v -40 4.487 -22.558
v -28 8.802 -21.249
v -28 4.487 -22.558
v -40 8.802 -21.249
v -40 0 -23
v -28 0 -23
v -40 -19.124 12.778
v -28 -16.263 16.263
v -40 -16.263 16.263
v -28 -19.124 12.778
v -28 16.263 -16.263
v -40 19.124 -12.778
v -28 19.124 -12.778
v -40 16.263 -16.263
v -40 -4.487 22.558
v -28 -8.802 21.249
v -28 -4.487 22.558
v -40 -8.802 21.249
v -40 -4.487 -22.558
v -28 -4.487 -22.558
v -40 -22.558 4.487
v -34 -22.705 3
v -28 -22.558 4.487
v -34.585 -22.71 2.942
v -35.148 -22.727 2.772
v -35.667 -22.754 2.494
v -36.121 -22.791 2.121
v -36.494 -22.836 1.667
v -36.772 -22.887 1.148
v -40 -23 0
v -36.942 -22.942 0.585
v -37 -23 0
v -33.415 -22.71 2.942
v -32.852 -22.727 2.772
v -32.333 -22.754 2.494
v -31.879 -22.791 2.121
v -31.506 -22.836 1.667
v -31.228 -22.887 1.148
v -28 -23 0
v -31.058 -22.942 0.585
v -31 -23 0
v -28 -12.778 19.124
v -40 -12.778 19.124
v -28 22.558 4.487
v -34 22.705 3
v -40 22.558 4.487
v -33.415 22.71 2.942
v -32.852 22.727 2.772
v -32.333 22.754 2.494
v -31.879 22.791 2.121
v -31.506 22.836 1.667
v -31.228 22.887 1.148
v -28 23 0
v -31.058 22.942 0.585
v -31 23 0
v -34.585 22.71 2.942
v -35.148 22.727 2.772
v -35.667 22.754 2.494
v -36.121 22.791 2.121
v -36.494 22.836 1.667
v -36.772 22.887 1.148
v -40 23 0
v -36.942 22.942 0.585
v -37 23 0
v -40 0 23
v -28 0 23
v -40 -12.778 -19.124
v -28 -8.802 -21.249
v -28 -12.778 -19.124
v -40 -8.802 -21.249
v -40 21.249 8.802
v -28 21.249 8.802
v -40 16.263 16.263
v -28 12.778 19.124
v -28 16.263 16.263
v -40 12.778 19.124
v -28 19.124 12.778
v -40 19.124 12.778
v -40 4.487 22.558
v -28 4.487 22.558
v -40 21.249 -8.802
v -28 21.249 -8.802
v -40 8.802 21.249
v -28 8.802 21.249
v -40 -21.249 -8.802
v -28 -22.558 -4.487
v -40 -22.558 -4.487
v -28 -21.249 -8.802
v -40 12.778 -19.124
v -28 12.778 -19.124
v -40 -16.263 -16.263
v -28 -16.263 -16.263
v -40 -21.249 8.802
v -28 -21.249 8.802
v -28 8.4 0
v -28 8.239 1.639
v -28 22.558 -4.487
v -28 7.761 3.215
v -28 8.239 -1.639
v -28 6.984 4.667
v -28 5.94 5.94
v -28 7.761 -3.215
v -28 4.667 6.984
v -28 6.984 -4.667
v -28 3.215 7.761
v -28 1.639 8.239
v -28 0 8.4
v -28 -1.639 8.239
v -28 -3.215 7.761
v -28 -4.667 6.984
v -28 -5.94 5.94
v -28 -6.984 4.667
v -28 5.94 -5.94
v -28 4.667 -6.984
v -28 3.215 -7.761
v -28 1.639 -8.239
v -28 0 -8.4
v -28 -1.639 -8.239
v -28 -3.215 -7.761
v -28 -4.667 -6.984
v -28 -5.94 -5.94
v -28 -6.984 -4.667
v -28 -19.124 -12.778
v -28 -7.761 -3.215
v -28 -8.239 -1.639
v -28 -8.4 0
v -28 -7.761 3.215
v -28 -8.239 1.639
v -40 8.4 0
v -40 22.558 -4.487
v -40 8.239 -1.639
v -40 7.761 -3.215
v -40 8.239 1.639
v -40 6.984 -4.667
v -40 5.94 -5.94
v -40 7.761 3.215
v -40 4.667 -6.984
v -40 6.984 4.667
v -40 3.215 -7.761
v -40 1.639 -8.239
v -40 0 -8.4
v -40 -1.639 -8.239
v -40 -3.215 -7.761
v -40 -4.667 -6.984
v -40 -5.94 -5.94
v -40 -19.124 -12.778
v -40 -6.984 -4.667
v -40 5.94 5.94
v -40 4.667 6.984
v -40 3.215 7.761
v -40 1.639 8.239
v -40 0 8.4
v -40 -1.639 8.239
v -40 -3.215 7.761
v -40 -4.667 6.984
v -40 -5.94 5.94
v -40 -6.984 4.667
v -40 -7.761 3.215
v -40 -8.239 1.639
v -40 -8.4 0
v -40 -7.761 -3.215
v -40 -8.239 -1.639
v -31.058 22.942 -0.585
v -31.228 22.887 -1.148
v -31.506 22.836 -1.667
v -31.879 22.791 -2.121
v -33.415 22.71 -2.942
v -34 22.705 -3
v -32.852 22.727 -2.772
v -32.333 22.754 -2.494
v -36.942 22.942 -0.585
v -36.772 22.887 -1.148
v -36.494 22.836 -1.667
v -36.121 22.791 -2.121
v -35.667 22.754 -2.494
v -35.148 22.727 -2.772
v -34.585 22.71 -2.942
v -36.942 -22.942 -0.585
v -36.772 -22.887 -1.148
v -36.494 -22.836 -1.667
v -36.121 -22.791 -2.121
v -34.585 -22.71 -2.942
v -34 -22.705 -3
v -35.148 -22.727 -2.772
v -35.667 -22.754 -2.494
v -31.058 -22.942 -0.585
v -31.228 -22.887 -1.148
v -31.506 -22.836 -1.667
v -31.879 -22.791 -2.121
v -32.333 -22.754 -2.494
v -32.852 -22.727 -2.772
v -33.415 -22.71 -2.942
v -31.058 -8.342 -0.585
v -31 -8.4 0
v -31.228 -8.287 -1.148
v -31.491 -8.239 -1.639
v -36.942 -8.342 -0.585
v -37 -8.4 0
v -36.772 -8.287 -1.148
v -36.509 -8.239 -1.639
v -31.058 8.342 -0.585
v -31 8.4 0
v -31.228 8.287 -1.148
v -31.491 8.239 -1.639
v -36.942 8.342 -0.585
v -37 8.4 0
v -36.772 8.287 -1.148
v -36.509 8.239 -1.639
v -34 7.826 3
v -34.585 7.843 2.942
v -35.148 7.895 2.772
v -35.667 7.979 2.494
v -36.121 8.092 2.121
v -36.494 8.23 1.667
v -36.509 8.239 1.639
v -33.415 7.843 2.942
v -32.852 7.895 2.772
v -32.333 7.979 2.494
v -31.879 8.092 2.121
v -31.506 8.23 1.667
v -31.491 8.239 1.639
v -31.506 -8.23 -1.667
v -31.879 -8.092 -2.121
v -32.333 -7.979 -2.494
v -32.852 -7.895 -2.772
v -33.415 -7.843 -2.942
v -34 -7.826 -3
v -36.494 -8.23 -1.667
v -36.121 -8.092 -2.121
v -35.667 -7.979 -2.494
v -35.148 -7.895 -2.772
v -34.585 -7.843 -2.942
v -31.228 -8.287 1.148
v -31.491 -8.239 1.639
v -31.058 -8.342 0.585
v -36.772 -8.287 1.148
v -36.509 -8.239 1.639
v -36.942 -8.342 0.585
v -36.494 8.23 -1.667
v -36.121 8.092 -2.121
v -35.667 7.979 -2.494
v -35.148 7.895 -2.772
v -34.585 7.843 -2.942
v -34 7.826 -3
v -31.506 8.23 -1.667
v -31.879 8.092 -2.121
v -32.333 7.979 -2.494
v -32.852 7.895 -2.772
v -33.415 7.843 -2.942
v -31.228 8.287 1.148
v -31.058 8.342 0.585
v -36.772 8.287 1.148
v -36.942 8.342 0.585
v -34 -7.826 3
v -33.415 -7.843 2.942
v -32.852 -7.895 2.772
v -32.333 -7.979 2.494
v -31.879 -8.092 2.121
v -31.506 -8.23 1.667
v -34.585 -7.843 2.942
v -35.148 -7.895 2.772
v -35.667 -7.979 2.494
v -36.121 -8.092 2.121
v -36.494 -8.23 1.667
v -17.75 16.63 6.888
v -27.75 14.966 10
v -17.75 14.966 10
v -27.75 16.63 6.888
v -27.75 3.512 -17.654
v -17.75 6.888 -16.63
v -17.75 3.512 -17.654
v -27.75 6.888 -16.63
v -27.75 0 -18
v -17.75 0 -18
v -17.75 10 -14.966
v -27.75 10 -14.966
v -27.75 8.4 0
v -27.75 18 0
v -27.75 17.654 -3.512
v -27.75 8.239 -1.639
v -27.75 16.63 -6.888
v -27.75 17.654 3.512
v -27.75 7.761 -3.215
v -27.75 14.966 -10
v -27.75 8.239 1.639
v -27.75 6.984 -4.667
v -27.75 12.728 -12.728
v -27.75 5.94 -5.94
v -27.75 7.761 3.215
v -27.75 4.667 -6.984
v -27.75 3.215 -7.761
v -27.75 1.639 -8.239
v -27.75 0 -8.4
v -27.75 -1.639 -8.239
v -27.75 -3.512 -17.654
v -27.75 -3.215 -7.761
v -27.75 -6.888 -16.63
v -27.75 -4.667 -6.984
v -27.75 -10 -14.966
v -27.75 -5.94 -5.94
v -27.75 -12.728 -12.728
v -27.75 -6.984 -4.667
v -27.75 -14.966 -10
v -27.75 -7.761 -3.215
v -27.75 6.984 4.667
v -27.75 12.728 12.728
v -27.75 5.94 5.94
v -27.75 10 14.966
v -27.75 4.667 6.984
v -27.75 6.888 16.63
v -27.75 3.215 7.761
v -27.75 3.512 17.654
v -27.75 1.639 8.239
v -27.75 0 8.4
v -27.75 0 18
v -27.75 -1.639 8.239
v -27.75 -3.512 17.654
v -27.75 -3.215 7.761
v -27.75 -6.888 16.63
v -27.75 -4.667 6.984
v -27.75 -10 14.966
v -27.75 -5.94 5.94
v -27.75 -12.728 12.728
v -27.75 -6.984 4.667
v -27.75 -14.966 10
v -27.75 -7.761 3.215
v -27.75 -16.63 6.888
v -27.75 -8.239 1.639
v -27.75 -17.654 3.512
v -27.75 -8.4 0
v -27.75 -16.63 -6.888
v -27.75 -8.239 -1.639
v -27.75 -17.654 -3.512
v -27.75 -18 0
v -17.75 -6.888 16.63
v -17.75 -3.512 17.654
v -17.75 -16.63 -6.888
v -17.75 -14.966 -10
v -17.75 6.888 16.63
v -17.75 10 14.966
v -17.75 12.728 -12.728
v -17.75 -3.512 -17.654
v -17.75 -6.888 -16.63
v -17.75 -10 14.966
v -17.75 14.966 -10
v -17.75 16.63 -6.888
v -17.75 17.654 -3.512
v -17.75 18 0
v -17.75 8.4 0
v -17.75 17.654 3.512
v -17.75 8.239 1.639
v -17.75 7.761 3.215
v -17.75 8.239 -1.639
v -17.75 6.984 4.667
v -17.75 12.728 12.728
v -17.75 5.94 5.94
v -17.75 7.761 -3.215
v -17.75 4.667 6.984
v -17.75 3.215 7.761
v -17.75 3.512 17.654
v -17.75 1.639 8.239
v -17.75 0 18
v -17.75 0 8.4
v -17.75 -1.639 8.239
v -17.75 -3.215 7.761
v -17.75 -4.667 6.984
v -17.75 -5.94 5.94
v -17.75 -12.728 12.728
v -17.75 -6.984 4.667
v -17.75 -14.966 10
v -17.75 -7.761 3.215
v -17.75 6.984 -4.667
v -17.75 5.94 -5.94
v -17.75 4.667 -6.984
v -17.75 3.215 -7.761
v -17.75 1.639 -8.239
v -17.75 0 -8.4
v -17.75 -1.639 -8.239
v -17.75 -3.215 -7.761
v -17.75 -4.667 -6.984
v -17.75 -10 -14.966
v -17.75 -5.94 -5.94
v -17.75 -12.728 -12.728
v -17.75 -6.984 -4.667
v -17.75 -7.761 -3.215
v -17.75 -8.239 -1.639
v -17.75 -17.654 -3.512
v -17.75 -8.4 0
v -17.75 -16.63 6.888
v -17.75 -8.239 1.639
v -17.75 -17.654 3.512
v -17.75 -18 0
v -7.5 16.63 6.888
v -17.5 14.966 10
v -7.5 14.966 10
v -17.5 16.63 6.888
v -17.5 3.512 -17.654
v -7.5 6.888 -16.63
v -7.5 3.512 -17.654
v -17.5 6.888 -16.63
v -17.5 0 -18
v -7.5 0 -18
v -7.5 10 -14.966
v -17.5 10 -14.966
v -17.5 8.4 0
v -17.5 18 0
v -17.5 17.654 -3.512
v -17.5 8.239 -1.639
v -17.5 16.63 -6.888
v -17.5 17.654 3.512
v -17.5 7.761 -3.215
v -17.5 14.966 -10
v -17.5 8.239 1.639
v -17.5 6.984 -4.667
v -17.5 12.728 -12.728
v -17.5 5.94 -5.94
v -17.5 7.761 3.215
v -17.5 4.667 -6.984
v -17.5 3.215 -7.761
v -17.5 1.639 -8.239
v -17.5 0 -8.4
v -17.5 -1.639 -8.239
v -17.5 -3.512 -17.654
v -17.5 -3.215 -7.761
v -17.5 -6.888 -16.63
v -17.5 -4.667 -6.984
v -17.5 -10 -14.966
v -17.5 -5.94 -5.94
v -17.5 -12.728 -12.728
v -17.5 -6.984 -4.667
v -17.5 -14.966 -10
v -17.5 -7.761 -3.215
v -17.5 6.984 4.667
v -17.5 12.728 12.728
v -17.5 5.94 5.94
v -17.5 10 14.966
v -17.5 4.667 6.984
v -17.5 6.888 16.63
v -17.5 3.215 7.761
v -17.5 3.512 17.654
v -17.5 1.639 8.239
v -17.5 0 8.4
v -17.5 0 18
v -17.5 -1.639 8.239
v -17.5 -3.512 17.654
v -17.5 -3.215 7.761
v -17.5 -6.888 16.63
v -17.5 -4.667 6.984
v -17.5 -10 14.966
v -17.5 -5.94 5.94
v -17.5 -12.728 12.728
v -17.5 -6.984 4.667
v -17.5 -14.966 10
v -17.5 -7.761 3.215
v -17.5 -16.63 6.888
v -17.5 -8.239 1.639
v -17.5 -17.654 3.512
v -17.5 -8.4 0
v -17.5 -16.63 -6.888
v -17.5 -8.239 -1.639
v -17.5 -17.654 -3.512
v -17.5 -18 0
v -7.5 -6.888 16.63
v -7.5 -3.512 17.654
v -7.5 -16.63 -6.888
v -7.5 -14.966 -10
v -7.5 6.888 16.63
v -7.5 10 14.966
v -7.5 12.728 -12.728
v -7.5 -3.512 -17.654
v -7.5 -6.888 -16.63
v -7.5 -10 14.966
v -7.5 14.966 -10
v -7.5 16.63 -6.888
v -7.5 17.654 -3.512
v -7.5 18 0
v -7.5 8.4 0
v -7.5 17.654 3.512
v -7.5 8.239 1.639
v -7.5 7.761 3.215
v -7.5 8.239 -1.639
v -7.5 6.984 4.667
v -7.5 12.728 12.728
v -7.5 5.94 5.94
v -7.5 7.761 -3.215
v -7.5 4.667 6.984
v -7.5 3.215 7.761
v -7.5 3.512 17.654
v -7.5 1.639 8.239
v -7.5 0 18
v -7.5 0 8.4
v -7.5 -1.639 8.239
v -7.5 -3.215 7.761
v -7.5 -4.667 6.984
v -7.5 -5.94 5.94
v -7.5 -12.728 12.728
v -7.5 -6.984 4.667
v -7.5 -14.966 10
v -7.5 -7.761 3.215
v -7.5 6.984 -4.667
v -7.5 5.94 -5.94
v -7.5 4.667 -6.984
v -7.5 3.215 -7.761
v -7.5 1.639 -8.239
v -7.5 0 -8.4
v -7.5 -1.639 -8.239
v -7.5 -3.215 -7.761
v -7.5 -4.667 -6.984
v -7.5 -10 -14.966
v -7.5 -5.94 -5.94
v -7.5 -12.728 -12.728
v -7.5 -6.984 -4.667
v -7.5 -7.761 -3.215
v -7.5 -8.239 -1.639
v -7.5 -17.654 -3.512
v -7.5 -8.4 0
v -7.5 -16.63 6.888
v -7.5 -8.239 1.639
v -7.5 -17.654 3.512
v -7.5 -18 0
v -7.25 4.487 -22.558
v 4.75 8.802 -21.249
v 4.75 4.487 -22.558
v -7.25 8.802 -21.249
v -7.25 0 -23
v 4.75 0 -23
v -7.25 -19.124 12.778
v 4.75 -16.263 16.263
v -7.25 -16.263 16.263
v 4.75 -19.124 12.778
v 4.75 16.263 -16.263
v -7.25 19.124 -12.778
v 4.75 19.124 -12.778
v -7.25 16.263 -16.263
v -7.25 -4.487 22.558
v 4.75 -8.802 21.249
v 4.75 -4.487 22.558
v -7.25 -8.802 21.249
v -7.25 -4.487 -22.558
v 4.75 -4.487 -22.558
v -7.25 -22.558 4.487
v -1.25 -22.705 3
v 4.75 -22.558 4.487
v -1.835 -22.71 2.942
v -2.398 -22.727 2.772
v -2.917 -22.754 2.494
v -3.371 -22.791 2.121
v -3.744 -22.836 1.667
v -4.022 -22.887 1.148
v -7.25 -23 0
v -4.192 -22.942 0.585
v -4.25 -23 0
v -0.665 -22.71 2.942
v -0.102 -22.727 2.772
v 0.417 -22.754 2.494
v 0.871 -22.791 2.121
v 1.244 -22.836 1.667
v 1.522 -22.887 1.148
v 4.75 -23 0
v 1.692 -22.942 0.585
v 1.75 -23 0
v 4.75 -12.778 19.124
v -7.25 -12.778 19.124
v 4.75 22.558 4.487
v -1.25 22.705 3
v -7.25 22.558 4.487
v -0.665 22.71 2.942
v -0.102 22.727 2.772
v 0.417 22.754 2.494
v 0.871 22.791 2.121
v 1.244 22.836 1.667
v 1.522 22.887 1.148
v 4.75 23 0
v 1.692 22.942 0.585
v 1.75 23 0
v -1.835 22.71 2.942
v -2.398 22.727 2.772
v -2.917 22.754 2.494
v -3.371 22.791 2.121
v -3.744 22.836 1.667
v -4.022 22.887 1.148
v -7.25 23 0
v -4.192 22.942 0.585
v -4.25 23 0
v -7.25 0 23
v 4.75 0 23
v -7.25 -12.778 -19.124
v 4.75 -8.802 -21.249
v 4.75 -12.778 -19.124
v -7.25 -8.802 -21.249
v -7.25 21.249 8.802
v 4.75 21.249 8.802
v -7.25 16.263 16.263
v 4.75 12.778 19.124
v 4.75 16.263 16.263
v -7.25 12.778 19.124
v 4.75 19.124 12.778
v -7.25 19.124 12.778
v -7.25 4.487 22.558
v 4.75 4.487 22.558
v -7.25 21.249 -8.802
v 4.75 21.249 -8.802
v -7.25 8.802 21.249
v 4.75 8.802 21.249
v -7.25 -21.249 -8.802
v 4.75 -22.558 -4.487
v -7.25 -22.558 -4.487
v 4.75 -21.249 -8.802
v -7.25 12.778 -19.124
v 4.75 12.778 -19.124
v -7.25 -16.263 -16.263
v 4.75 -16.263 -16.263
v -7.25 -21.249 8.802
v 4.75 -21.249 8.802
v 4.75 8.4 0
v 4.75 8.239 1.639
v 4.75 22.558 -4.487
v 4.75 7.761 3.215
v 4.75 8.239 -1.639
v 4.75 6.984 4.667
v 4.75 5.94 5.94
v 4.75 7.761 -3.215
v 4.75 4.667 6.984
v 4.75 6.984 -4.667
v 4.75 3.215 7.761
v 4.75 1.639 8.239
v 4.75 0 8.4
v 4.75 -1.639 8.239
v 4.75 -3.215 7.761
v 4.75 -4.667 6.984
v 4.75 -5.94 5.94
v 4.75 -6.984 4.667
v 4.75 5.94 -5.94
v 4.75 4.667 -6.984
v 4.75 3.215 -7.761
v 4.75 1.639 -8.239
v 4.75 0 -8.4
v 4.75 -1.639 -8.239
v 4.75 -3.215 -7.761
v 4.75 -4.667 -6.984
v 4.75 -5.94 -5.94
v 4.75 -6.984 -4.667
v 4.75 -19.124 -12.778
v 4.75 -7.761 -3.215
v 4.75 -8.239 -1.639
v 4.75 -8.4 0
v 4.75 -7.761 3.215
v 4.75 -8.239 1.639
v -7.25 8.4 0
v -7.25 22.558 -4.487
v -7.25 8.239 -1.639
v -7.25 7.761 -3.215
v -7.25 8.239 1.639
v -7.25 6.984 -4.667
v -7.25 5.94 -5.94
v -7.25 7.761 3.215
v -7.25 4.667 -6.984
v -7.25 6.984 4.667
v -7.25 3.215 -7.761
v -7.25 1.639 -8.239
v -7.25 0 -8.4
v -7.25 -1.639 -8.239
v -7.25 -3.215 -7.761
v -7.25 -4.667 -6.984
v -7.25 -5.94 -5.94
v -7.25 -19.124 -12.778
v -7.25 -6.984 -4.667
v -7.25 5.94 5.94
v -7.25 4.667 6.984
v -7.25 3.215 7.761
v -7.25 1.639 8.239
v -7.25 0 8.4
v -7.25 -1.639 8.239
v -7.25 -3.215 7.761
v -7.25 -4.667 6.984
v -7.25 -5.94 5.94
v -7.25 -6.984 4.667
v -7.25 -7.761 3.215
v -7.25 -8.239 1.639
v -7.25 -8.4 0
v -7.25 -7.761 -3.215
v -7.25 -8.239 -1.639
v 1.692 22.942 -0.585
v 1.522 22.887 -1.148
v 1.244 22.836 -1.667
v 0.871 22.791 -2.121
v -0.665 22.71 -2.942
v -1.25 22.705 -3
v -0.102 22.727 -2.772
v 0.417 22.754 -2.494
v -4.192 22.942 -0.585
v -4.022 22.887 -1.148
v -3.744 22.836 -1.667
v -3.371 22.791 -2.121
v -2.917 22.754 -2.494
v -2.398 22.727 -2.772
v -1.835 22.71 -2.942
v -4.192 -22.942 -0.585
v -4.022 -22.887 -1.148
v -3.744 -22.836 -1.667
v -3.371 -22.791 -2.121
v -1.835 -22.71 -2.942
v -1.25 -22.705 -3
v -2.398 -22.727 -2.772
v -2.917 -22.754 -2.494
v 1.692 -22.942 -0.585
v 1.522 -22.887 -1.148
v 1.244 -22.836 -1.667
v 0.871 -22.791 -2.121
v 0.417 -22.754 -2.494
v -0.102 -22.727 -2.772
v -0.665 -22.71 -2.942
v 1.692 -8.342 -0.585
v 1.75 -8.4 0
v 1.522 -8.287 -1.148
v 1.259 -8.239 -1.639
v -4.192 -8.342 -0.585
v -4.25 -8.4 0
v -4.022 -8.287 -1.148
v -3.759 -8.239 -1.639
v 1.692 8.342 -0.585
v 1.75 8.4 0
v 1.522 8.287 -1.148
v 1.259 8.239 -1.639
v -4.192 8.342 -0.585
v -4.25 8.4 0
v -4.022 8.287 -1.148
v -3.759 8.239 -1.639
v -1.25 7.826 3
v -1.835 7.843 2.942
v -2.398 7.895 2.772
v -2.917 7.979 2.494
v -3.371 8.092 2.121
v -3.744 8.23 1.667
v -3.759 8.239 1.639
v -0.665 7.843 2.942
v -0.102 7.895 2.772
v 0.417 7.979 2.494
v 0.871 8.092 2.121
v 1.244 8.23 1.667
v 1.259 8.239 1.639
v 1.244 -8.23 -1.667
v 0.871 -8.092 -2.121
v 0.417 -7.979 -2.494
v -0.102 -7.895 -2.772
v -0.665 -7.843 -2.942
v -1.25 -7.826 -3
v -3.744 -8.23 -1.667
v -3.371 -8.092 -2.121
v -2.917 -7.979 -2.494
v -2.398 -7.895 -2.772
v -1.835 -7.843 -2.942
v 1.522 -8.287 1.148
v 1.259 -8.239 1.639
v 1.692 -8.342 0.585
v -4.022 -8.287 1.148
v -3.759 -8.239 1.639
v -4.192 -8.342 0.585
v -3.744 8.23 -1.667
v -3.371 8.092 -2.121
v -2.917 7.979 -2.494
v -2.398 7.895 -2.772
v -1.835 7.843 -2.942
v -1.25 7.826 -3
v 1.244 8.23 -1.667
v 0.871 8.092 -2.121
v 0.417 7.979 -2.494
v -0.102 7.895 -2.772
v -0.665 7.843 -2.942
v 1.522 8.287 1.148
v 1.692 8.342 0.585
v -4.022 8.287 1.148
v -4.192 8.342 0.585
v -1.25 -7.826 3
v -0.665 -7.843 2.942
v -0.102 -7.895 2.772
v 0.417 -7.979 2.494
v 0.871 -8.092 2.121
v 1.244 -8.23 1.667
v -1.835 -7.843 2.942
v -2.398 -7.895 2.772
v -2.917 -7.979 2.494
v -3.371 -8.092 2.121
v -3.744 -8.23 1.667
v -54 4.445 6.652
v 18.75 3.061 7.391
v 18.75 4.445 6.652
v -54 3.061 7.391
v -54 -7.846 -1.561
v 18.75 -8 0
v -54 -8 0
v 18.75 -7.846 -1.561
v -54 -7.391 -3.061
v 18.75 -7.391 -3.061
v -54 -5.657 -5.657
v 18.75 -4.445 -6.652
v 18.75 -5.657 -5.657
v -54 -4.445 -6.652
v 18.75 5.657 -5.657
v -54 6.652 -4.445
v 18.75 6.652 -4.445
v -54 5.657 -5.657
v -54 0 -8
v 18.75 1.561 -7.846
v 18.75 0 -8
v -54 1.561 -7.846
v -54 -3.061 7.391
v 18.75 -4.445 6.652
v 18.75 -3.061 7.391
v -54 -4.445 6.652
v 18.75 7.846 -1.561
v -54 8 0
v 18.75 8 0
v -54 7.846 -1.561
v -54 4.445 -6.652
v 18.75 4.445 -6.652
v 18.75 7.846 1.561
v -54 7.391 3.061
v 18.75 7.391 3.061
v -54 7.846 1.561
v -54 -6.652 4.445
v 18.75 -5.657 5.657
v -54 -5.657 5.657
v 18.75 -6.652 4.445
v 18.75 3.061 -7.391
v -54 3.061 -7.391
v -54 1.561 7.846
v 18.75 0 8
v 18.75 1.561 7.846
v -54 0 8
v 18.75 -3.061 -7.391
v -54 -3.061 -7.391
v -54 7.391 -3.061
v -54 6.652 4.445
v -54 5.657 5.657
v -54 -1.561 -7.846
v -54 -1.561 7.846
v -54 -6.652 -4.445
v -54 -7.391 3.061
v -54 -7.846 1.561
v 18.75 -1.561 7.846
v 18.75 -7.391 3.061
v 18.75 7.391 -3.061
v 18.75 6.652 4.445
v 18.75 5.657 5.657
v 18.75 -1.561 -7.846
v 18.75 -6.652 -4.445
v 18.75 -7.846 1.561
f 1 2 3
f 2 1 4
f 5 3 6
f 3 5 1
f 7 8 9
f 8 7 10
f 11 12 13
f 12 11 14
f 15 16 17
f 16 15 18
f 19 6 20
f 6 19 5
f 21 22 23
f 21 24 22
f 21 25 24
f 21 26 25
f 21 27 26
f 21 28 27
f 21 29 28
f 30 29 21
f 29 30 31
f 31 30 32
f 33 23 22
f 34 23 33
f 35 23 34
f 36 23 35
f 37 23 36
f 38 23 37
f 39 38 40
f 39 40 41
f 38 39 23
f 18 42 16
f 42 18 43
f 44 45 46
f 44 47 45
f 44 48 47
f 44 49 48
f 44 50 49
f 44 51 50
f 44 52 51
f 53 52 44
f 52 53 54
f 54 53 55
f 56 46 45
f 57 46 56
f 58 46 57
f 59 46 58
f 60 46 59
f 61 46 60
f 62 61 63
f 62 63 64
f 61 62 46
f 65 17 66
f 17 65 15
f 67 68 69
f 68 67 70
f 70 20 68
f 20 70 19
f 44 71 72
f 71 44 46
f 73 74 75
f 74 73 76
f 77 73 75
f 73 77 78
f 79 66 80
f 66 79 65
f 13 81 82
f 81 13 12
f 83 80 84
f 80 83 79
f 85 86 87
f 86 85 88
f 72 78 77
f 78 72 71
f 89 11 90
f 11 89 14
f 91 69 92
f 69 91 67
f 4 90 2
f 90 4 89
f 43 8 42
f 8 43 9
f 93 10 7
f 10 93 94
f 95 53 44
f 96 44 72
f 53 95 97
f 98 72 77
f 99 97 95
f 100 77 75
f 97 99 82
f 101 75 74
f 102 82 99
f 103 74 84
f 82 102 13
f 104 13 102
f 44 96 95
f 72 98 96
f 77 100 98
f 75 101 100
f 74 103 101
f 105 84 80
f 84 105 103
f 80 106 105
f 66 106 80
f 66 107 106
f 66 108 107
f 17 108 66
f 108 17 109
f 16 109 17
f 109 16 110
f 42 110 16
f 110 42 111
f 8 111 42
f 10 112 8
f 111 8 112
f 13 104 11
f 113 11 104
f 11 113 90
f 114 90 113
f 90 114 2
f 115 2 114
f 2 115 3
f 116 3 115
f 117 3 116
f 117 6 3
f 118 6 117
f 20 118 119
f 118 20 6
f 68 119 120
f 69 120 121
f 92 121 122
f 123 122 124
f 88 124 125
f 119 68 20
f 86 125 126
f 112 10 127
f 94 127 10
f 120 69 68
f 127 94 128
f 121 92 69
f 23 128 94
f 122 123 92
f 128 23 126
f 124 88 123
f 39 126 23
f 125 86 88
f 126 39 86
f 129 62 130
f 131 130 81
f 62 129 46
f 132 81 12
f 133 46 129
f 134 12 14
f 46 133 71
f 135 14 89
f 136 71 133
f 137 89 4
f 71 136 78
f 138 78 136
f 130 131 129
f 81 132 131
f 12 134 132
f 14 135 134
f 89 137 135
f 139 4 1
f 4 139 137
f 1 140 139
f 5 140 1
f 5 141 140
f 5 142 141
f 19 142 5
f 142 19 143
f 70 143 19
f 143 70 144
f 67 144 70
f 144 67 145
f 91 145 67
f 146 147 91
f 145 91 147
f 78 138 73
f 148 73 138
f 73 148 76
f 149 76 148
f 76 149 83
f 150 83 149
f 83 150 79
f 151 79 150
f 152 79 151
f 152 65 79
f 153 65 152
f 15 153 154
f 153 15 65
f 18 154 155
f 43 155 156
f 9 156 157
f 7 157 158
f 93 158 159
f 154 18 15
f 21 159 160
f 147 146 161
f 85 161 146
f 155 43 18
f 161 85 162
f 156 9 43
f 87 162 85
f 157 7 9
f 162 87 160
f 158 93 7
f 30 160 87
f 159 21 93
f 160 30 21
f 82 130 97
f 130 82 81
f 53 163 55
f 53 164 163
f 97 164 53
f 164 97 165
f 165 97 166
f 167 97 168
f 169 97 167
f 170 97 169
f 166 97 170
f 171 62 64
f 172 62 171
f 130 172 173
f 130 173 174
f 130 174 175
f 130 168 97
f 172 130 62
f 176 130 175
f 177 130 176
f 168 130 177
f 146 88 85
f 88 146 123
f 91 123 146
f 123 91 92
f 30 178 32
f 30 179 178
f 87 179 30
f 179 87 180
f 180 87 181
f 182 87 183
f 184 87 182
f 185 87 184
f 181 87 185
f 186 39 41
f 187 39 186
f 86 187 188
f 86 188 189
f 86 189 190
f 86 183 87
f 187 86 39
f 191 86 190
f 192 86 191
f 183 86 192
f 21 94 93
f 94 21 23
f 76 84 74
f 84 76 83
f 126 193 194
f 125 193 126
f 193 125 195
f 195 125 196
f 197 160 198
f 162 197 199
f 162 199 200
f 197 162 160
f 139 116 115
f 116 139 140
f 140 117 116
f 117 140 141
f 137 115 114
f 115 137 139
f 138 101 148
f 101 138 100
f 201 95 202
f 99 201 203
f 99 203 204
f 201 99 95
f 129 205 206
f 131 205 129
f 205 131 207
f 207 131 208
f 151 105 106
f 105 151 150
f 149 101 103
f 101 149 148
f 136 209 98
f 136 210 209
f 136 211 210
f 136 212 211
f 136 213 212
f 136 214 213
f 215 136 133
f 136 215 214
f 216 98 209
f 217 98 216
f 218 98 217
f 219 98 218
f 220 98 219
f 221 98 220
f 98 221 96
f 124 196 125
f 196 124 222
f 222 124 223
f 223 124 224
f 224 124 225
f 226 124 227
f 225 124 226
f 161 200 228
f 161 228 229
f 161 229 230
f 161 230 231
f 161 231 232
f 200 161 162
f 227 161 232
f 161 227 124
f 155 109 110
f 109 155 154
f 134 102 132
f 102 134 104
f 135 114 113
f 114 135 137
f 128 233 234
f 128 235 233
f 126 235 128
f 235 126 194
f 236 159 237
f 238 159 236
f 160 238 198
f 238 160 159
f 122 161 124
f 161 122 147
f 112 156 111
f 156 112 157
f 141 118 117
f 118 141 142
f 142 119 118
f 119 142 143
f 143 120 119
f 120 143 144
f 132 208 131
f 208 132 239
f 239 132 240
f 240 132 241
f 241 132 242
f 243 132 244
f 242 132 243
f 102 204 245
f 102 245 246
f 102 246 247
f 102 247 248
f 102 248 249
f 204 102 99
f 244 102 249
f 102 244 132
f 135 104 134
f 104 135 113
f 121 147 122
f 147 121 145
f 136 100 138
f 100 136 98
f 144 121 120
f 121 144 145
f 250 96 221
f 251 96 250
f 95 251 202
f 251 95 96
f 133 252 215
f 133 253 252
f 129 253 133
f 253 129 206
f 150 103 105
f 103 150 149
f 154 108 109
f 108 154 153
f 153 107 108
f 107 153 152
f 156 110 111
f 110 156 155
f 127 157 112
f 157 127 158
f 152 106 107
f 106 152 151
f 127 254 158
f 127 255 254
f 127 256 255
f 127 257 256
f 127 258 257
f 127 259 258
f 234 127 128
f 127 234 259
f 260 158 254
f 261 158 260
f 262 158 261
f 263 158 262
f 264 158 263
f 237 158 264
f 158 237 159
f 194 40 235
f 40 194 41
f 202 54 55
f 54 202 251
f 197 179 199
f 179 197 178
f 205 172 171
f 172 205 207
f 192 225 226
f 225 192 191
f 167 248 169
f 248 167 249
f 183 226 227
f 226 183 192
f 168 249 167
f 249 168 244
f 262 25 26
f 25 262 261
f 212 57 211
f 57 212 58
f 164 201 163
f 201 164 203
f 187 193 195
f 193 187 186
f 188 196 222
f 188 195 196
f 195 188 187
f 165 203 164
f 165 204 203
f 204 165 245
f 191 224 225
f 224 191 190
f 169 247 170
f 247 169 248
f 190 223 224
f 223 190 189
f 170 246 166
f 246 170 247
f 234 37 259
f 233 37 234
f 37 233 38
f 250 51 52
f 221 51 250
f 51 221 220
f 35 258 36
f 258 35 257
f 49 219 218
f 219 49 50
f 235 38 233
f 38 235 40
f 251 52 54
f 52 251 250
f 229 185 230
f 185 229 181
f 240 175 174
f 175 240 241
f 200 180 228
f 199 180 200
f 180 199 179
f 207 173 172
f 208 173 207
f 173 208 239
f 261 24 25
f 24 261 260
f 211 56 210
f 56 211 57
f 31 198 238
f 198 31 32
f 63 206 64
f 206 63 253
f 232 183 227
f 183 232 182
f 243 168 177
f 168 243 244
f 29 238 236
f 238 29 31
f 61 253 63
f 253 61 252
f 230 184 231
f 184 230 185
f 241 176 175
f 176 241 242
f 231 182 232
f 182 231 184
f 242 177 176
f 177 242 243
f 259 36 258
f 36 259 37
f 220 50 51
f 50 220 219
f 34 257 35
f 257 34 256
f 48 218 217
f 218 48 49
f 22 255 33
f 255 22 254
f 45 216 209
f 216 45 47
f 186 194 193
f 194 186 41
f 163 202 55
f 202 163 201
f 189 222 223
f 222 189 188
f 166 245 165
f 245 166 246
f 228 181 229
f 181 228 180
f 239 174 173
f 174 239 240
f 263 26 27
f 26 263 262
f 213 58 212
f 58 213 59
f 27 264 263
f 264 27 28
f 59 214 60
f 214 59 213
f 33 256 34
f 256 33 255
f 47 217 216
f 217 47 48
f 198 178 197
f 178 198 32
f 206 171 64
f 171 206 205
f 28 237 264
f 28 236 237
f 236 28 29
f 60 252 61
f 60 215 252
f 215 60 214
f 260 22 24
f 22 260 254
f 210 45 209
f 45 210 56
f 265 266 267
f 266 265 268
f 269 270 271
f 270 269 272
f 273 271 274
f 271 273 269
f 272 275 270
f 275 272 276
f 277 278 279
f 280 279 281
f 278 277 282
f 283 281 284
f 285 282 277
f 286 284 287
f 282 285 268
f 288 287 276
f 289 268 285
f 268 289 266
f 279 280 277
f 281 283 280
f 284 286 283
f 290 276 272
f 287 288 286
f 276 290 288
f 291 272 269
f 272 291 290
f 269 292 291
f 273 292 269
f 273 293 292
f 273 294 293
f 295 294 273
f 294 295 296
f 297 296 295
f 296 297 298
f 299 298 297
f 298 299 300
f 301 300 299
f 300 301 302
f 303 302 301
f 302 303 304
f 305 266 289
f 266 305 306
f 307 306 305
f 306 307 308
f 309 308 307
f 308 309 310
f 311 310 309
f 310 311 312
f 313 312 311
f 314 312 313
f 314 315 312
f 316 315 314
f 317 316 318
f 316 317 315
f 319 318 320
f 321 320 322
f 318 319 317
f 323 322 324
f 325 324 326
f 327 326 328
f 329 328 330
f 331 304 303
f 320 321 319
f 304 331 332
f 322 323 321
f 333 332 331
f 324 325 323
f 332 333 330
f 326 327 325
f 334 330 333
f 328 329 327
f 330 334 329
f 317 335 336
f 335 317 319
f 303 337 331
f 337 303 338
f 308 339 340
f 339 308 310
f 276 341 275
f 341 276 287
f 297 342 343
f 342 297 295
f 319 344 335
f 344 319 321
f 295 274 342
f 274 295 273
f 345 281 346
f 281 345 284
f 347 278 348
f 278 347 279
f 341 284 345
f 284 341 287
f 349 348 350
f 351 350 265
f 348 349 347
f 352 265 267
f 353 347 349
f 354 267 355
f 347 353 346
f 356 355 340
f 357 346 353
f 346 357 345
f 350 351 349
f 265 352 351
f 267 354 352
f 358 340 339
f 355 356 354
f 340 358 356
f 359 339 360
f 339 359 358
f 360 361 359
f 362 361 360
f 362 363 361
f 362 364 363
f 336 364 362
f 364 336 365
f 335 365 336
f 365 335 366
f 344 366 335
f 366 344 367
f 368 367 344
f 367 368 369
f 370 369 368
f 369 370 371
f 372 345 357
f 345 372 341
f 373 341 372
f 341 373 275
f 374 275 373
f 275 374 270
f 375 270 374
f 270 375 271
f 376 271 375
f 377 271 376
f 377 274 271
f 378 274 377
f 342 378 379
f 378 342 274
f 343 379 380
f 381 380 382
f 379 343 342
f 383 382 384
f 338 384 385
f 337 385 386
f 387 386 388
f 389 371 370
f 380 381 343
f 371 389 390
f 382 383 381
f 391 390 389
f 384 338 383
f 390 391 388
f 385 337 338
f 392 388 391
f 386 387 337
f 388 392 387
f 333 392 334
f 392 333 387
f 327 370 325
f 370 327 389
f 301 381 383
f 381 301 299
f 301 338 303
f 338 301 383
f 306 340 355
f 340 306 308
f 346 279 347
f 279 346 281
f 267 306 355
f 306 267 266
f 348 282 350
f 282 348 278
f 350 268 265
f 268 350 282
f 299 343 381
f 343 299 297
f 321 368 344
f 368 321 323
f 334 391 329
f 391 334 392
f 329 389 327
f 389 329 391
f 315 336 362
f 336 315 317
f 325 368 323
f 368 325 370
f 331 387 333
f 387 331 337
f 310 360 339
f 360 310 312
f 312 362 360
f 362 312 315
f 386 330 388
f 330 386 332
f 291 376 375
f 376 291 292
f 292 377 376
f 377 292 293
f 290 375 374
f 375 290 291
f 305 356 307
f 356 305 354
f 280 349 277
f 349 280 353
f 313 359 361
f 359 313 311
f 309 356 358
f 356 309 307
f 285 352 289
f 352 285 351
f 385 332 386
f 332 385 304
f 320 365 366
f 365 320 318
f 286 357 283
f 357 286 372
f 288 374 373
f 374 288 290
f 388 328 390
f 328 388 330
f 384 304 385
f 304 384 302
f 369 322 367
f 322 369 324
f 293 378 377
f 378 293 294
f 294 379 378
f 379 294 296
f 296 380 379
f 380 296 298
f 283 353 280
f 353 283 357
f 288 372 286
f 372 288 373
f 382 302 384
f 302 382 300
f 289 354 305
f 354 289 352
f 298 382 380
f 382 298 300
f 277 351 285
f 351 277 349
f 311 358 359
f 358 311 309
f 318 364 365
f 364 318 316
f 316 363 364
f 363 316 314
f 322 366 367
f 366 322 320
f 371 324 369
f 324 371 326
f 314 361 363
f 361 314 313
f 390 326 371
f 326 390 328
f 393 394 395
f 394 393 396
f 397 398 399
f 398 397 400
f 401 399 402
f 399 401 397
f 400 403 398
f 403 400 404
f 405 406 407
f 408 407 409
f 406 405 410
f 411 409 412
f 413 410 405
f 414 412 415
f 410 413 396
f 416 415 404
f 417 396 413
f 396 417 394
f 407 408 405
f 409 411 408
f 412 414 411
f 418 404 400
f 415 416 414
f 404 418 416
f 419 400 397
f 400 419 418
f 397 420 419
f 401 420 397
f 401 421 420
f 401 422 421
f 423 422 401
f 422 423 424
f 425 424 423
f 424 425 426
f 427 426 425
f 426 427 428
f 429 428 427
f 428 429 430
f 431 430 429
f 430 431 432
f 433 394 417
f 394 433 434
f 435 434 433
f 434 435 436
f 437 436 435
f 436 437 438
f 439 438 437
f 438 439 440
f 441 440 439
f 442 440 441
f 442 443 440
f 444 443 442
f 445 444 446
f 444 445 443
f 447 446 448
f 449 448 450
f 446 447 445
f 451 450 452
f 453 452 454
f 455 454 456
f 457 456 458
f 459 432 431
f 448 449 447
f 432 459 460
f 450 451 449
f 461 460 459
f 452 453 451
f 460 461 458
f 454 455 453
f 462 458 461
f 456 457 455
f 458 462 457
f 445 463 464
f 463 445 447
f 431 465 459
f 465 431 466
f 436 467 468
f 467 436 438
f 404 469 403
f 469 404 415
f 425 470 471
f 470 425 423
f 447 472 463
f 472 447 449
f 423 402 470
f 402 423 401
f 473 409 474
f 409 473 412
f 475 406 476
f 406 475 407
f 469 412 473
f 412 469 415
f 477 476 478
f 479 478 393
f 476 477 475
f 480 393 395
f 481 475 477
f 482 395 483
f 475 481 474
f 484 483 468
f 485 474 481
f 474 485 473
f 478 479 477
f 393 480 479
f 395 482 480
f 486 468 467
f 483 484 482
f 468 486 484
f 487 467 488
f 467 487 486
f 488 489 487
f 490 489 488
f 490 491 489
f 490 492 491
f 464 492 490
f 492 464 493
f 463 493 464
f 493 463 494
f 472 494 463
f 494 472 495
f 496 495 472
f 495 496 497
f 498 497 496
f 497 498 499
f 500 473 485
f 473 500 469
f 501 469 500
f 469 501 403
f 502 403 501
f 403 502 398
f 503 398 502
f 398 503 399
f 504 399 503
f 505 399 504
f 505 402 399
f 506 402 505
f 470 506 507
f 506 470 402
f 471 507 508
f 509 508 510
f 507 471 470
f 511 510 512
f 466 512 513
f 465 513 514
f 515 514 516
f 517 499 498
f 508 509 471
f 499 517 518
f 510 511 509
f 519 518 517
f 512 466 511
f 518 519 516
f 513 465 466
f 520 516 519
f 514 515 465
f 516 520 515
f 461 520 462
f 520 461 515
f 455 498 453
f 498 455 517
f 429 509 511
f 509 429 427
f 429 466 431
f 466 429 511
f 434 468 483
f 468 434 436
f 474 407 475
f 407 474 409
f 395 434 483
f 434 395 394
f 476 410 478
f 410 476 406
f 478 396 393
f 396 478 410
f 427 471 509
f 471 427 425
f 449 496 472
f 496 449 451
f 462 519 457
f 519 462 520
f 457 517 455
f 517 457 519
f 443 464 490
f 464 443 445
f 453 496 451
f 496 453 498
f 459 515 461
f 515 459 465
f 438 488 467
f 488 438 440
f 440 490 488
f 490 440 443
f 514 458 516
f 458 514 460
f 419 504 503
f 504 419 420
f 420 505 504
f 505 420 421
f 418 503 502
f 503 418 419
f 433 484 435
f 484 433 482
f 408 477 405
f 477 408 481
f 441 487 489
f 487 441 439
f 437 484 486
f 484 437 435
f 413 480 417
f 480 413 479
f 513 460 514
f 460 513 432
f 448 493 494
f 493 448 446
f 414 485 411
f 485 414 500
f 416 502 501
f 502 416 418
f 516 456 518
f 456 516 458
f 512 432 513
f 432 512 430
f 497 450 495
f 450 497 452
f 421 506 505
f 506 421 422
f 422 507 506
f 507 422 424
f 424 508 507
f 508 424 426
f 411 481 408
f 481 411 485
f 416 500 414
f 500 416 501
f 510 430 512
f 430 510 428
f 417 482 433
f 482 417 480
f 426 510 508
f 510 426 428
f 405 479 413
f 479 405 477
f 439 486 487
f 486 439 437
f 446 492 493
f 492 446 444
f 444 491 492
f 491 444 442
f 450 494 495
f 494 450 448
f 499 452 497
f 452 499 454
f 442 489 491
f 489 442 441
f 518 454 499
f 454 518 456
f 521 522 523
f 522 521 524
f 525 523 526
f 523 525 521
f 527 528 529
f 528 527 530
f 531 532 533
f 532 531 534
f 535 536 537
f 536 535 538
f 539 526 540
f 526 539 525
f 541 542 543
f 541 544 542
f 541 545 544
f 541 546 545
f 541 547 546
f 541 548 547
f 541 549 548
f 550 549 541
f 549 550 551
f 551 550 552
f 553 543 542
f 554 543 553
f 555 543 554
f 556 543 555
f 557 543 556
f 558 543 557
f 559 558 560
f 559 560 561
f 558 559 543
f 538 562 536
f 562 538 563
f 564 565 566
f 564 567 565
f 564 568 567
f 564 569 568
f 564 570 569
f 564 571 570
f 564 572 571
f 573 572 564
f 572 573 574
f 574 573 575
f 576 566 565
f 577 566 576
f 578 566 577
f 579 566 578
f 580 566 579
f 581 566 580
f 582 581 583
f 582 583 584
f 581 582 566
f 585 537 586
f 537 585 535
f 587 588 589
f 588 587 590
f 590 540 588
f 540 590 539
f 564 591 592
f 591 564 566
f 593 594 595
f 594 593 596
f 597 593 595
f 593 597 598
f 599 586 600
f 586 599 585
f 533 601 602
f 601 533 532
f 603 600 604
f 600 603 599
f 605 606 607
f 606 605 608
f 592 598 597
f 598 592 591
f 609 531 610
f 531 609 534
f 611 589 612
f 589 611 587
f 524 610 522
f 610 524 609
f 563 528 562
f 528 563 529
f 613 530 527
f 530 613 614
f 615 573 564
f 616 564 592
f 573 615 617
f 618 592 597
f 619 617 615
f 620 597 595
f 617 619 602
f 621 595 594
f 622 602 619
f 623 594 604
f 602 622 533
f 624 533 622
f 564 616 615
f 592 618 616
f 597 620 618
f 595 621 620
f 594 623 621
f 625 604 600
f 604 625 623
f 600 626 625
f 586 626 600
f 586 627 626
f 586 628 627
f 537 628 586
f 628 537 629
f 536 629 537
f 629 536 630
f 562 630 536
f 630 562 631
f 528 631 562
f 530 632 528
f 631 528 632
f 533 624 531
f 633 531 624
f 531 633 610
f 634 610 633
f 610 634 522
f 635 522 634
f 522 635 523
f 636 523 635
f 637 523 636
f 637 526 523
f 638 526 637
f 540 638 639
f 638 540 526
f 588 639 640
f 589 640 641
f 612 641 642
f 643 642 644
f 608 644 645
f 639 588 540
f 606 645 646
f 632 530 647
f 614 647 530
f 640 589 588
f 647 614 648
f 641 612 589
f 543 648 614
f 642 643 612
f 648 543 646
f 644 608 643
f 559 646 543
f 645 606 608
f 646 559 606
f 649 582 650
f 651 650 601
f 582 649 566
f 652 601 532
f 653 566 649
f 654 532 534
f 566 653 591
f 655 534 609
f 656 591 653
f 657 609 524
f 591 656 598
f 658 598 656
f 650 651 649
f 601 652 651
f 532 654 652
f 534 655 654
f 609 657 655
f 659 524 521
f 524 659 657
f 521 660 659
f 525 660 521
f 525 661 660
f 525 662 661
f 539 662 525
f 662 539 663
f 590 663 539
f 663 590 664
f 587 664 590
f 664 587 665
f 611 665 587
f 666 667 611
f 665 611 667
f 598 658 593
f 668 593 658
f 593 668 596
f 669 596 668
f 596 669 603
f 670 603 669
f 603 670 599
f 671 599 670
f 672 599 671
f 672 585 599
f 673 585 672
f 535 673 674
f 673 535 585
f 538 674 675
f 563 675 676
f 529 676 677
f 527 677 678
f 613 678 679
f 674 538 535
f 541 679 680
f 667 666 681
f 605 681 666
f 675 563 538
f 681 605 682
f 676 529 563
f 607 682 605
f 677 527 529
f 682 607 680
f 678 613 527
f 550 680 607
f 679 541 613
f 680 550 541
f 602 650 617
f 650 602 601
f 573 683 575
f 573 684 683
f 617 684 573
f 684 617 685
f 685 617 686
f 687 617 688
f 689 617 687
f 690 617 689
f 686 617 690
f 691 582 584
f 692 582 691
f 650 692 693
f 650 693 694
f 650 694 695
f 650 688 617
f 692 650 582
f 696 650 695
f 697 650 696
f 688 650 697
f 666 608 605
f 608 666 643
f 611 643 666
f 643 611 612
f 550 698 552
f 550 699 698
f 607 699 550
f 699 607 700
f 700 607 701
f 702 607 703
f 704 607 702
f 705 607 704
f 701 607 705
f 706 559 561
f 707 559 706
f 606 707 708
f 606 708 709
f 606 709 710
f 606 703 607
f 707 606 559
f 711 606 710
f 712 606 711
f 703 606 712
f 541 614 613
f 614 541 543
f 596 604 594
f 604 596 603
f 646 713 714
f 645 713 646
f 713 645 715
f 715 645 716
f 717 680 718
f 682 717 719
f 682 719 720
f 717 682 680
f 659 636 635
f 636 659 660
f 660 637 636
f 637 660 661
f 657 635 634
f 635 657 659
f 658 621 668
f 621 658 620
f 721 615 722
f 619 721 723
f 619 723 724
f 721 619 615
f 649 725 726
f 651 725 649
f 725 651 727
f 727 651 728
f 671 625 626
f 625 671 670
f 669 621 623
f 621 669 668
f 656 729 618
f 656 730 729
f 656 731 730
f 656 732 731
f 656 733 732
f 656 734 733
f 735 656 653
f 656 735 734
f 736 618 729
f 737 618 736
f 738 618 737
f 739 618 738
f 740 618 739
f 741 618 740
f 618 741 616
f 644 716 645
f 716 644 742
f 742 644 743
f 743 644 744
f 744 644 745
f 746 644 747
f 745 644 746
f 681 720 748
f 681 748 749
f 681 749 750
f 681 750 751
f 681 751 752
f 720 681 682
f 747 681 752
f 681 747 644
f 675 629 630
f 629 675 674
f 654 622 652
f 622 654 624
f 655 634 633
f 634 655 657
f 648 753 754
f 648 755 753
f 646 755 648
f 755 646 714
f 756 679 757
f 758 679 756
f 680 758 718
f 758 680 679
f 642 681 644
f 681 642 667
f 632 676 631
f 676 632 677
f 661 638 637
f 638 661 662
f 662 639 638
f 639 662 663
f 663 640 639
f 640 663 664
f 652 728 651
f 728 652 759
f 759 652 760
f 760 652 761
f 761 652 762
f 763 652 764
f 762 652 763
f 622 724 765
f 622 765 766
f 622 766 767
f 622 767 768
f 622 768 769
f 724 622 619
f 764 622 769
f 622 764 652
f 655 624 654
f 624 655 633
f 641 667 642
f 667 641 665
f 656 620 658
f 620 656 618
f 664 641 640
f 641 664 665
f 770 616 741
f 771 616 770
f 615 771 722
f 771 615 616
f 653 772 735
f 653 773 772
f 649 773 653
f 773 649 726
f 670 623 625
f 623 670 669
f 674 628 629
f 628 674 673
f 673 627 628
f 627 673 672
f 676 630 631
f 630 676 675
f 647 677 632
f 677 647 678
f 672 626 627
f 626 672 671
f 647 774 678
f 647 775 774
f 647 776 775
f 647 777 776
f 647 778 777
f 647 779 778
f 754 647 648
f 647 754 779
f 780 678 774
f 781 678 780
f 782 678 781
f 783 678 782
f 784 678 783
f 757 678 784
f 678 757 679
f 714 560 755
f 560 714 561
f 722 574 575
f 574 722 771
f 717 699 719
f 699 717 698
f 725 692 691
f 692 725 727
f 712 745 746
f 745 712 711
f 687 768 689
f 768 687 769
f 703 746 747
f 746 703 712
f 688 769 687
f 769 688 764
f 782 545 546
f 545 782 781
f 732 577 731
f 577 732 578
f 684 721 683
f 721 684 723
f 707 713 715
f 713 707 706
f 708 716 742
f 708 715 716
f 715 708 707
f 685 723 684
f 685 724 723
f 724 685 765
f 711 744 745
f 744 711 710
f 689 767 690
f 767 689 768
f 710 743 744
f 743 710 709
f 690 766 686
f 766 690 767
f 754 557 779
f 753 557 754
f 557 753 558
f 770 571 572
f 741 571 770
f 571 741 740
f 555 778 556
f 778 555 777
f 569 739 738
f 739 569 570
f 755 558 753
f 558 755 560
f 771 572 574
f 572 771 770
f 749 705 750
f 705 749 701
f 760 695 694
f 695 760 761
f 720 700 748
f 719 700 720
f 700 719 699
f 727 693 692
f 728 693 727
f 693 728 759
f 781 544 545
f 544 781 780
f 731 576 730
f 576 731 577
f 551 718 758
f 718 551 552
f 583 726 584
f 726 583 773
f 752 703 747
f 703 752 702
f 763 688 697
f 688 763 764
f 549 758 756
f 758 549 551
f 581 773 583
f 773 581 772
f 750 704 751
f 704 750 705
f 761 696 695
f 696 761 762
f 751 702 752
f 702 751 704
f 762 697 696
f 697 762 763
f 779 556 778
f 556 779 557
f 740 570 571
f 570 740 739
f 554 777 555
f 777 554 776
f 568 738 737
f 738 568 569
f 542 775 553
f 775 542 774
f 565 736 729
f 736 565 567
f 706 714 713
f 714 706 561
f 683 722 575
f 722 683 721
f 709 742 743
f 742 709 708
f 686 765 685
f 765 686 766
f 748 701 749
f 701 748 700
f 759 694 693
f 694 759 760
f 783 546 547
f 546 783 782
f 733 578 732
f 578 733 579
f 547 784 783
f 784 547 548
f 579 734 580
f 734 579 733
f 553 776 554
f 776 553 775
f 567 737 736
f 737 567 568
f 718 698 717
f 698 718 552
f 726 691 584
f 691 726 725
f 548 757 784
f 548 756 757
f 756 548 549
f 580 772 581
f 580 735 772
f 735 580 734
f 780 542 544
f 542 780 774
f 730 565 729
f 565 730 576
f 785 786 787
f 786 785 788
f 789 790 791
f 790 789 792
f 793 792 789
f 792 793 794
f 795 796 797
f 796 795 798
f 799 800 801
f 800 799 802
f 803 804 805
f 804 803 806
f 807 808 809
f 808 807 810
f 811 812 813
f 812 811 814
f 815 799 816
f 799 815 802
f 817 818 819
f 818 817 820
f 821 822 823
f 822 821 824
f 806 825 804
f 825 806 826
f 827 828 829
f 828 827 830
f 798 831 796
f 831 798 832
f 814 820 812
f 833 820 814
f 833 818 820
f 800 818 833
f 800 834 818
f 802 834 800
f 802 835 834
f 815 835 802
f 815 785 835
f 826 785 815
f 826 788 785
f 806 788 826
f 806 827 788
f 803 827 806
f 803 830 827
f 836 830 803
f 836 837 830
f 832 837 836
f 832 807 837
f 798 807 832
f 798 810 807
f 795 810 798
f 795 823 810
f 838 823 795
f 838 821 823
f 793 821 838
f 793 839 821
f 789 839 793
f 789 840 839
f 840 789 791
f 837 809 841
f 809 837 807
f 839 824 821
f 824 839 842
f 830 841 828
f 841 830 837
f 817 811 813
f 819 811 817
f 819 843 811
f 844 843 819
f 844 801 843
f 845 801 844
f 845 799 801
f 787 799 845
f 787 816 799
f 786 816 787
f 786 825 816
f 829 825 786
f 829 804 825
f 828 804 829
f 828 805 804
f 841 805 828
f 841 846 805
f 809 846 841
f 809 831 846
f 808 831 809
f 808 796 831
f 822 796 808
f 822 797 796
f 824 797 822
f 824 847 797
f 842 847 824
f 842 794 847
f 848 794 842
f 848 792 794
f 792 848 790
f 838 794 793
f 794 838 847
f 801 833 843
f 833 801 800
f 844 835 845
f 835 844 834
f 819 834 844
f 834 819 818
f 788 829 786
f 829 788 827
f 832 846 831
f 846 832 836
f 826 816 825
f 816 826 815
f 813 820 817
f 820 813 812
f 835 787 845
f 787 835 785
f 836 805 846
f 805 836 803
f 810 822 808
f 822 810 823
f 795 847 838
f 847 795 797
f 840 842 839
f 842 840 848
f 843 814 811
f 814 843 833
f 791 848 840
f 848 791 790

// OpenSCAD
$fn = 32;

// ------------------------------------------------------------------------
// Shaft with rings and collars: d16 shaft, 4 rings
// Every part is its own module, assembly() places them once.
// ------------------------------------------------------------------------

// --- part 1 ---
module shaft() {
  translate([0, 0, -36.375]) cylinder(h = 72.75, d = 16);
}

// --- part 2 ---
module collar_a() {
  difference() {
    cylinder(h = 12, d = 46);
    translate([0, 0, -1]) cylinder(h = 14, d = 16.8);
    translate([0, 0, 6]) rotate([90, 0, 0]) cylinder(h = 48, d = 6, center = true);
  }
}

// --- part 3 ---
module spacer_a() {
  difference() {
      translate([0, 0, 0]) cylinder(h = 10, d = 36);
      translate([0, 0, -1]) cylinder(h = 12, d = 16.8);
    }
}

// --- part 4 ---
module spacer_b() {
  difference() {
      translate([0, 0, 0]) cylinder(h = 10, d = 36);
      translate([0, 0, -1]) cylinder(h = 12, d = 16.8);
    }
}

// --- part 5 ---
module collar_b() {
  difference() {
    cylinder(h = 12, d = 46);
    translate([0, 0, -1]) cylinder(h = 14, d = 16.8);
    translate([0, 0, 6]) rotate([90, 0, 0]) cylinder(h = 48, d = 6, center = true);
  }
}

// --- assembly ---
module assembly() {
  translate([-17.625, 0, 0]) rotate([0, 90, 0]) shaft();
  translate([-40, 0, 0]) rotate([0, 90, 0]) collar_a();
  translate([-27.75, 0, 0]) rotate([0, 90, 0]) spacer_a();
  translate([-17.5, 0, 0]) rotate([0, 90, 0]) spacer_b();
  translate([-7.25, 0, 0]) rotate([0, 90, 0]) collar_b();
}

assembly();
